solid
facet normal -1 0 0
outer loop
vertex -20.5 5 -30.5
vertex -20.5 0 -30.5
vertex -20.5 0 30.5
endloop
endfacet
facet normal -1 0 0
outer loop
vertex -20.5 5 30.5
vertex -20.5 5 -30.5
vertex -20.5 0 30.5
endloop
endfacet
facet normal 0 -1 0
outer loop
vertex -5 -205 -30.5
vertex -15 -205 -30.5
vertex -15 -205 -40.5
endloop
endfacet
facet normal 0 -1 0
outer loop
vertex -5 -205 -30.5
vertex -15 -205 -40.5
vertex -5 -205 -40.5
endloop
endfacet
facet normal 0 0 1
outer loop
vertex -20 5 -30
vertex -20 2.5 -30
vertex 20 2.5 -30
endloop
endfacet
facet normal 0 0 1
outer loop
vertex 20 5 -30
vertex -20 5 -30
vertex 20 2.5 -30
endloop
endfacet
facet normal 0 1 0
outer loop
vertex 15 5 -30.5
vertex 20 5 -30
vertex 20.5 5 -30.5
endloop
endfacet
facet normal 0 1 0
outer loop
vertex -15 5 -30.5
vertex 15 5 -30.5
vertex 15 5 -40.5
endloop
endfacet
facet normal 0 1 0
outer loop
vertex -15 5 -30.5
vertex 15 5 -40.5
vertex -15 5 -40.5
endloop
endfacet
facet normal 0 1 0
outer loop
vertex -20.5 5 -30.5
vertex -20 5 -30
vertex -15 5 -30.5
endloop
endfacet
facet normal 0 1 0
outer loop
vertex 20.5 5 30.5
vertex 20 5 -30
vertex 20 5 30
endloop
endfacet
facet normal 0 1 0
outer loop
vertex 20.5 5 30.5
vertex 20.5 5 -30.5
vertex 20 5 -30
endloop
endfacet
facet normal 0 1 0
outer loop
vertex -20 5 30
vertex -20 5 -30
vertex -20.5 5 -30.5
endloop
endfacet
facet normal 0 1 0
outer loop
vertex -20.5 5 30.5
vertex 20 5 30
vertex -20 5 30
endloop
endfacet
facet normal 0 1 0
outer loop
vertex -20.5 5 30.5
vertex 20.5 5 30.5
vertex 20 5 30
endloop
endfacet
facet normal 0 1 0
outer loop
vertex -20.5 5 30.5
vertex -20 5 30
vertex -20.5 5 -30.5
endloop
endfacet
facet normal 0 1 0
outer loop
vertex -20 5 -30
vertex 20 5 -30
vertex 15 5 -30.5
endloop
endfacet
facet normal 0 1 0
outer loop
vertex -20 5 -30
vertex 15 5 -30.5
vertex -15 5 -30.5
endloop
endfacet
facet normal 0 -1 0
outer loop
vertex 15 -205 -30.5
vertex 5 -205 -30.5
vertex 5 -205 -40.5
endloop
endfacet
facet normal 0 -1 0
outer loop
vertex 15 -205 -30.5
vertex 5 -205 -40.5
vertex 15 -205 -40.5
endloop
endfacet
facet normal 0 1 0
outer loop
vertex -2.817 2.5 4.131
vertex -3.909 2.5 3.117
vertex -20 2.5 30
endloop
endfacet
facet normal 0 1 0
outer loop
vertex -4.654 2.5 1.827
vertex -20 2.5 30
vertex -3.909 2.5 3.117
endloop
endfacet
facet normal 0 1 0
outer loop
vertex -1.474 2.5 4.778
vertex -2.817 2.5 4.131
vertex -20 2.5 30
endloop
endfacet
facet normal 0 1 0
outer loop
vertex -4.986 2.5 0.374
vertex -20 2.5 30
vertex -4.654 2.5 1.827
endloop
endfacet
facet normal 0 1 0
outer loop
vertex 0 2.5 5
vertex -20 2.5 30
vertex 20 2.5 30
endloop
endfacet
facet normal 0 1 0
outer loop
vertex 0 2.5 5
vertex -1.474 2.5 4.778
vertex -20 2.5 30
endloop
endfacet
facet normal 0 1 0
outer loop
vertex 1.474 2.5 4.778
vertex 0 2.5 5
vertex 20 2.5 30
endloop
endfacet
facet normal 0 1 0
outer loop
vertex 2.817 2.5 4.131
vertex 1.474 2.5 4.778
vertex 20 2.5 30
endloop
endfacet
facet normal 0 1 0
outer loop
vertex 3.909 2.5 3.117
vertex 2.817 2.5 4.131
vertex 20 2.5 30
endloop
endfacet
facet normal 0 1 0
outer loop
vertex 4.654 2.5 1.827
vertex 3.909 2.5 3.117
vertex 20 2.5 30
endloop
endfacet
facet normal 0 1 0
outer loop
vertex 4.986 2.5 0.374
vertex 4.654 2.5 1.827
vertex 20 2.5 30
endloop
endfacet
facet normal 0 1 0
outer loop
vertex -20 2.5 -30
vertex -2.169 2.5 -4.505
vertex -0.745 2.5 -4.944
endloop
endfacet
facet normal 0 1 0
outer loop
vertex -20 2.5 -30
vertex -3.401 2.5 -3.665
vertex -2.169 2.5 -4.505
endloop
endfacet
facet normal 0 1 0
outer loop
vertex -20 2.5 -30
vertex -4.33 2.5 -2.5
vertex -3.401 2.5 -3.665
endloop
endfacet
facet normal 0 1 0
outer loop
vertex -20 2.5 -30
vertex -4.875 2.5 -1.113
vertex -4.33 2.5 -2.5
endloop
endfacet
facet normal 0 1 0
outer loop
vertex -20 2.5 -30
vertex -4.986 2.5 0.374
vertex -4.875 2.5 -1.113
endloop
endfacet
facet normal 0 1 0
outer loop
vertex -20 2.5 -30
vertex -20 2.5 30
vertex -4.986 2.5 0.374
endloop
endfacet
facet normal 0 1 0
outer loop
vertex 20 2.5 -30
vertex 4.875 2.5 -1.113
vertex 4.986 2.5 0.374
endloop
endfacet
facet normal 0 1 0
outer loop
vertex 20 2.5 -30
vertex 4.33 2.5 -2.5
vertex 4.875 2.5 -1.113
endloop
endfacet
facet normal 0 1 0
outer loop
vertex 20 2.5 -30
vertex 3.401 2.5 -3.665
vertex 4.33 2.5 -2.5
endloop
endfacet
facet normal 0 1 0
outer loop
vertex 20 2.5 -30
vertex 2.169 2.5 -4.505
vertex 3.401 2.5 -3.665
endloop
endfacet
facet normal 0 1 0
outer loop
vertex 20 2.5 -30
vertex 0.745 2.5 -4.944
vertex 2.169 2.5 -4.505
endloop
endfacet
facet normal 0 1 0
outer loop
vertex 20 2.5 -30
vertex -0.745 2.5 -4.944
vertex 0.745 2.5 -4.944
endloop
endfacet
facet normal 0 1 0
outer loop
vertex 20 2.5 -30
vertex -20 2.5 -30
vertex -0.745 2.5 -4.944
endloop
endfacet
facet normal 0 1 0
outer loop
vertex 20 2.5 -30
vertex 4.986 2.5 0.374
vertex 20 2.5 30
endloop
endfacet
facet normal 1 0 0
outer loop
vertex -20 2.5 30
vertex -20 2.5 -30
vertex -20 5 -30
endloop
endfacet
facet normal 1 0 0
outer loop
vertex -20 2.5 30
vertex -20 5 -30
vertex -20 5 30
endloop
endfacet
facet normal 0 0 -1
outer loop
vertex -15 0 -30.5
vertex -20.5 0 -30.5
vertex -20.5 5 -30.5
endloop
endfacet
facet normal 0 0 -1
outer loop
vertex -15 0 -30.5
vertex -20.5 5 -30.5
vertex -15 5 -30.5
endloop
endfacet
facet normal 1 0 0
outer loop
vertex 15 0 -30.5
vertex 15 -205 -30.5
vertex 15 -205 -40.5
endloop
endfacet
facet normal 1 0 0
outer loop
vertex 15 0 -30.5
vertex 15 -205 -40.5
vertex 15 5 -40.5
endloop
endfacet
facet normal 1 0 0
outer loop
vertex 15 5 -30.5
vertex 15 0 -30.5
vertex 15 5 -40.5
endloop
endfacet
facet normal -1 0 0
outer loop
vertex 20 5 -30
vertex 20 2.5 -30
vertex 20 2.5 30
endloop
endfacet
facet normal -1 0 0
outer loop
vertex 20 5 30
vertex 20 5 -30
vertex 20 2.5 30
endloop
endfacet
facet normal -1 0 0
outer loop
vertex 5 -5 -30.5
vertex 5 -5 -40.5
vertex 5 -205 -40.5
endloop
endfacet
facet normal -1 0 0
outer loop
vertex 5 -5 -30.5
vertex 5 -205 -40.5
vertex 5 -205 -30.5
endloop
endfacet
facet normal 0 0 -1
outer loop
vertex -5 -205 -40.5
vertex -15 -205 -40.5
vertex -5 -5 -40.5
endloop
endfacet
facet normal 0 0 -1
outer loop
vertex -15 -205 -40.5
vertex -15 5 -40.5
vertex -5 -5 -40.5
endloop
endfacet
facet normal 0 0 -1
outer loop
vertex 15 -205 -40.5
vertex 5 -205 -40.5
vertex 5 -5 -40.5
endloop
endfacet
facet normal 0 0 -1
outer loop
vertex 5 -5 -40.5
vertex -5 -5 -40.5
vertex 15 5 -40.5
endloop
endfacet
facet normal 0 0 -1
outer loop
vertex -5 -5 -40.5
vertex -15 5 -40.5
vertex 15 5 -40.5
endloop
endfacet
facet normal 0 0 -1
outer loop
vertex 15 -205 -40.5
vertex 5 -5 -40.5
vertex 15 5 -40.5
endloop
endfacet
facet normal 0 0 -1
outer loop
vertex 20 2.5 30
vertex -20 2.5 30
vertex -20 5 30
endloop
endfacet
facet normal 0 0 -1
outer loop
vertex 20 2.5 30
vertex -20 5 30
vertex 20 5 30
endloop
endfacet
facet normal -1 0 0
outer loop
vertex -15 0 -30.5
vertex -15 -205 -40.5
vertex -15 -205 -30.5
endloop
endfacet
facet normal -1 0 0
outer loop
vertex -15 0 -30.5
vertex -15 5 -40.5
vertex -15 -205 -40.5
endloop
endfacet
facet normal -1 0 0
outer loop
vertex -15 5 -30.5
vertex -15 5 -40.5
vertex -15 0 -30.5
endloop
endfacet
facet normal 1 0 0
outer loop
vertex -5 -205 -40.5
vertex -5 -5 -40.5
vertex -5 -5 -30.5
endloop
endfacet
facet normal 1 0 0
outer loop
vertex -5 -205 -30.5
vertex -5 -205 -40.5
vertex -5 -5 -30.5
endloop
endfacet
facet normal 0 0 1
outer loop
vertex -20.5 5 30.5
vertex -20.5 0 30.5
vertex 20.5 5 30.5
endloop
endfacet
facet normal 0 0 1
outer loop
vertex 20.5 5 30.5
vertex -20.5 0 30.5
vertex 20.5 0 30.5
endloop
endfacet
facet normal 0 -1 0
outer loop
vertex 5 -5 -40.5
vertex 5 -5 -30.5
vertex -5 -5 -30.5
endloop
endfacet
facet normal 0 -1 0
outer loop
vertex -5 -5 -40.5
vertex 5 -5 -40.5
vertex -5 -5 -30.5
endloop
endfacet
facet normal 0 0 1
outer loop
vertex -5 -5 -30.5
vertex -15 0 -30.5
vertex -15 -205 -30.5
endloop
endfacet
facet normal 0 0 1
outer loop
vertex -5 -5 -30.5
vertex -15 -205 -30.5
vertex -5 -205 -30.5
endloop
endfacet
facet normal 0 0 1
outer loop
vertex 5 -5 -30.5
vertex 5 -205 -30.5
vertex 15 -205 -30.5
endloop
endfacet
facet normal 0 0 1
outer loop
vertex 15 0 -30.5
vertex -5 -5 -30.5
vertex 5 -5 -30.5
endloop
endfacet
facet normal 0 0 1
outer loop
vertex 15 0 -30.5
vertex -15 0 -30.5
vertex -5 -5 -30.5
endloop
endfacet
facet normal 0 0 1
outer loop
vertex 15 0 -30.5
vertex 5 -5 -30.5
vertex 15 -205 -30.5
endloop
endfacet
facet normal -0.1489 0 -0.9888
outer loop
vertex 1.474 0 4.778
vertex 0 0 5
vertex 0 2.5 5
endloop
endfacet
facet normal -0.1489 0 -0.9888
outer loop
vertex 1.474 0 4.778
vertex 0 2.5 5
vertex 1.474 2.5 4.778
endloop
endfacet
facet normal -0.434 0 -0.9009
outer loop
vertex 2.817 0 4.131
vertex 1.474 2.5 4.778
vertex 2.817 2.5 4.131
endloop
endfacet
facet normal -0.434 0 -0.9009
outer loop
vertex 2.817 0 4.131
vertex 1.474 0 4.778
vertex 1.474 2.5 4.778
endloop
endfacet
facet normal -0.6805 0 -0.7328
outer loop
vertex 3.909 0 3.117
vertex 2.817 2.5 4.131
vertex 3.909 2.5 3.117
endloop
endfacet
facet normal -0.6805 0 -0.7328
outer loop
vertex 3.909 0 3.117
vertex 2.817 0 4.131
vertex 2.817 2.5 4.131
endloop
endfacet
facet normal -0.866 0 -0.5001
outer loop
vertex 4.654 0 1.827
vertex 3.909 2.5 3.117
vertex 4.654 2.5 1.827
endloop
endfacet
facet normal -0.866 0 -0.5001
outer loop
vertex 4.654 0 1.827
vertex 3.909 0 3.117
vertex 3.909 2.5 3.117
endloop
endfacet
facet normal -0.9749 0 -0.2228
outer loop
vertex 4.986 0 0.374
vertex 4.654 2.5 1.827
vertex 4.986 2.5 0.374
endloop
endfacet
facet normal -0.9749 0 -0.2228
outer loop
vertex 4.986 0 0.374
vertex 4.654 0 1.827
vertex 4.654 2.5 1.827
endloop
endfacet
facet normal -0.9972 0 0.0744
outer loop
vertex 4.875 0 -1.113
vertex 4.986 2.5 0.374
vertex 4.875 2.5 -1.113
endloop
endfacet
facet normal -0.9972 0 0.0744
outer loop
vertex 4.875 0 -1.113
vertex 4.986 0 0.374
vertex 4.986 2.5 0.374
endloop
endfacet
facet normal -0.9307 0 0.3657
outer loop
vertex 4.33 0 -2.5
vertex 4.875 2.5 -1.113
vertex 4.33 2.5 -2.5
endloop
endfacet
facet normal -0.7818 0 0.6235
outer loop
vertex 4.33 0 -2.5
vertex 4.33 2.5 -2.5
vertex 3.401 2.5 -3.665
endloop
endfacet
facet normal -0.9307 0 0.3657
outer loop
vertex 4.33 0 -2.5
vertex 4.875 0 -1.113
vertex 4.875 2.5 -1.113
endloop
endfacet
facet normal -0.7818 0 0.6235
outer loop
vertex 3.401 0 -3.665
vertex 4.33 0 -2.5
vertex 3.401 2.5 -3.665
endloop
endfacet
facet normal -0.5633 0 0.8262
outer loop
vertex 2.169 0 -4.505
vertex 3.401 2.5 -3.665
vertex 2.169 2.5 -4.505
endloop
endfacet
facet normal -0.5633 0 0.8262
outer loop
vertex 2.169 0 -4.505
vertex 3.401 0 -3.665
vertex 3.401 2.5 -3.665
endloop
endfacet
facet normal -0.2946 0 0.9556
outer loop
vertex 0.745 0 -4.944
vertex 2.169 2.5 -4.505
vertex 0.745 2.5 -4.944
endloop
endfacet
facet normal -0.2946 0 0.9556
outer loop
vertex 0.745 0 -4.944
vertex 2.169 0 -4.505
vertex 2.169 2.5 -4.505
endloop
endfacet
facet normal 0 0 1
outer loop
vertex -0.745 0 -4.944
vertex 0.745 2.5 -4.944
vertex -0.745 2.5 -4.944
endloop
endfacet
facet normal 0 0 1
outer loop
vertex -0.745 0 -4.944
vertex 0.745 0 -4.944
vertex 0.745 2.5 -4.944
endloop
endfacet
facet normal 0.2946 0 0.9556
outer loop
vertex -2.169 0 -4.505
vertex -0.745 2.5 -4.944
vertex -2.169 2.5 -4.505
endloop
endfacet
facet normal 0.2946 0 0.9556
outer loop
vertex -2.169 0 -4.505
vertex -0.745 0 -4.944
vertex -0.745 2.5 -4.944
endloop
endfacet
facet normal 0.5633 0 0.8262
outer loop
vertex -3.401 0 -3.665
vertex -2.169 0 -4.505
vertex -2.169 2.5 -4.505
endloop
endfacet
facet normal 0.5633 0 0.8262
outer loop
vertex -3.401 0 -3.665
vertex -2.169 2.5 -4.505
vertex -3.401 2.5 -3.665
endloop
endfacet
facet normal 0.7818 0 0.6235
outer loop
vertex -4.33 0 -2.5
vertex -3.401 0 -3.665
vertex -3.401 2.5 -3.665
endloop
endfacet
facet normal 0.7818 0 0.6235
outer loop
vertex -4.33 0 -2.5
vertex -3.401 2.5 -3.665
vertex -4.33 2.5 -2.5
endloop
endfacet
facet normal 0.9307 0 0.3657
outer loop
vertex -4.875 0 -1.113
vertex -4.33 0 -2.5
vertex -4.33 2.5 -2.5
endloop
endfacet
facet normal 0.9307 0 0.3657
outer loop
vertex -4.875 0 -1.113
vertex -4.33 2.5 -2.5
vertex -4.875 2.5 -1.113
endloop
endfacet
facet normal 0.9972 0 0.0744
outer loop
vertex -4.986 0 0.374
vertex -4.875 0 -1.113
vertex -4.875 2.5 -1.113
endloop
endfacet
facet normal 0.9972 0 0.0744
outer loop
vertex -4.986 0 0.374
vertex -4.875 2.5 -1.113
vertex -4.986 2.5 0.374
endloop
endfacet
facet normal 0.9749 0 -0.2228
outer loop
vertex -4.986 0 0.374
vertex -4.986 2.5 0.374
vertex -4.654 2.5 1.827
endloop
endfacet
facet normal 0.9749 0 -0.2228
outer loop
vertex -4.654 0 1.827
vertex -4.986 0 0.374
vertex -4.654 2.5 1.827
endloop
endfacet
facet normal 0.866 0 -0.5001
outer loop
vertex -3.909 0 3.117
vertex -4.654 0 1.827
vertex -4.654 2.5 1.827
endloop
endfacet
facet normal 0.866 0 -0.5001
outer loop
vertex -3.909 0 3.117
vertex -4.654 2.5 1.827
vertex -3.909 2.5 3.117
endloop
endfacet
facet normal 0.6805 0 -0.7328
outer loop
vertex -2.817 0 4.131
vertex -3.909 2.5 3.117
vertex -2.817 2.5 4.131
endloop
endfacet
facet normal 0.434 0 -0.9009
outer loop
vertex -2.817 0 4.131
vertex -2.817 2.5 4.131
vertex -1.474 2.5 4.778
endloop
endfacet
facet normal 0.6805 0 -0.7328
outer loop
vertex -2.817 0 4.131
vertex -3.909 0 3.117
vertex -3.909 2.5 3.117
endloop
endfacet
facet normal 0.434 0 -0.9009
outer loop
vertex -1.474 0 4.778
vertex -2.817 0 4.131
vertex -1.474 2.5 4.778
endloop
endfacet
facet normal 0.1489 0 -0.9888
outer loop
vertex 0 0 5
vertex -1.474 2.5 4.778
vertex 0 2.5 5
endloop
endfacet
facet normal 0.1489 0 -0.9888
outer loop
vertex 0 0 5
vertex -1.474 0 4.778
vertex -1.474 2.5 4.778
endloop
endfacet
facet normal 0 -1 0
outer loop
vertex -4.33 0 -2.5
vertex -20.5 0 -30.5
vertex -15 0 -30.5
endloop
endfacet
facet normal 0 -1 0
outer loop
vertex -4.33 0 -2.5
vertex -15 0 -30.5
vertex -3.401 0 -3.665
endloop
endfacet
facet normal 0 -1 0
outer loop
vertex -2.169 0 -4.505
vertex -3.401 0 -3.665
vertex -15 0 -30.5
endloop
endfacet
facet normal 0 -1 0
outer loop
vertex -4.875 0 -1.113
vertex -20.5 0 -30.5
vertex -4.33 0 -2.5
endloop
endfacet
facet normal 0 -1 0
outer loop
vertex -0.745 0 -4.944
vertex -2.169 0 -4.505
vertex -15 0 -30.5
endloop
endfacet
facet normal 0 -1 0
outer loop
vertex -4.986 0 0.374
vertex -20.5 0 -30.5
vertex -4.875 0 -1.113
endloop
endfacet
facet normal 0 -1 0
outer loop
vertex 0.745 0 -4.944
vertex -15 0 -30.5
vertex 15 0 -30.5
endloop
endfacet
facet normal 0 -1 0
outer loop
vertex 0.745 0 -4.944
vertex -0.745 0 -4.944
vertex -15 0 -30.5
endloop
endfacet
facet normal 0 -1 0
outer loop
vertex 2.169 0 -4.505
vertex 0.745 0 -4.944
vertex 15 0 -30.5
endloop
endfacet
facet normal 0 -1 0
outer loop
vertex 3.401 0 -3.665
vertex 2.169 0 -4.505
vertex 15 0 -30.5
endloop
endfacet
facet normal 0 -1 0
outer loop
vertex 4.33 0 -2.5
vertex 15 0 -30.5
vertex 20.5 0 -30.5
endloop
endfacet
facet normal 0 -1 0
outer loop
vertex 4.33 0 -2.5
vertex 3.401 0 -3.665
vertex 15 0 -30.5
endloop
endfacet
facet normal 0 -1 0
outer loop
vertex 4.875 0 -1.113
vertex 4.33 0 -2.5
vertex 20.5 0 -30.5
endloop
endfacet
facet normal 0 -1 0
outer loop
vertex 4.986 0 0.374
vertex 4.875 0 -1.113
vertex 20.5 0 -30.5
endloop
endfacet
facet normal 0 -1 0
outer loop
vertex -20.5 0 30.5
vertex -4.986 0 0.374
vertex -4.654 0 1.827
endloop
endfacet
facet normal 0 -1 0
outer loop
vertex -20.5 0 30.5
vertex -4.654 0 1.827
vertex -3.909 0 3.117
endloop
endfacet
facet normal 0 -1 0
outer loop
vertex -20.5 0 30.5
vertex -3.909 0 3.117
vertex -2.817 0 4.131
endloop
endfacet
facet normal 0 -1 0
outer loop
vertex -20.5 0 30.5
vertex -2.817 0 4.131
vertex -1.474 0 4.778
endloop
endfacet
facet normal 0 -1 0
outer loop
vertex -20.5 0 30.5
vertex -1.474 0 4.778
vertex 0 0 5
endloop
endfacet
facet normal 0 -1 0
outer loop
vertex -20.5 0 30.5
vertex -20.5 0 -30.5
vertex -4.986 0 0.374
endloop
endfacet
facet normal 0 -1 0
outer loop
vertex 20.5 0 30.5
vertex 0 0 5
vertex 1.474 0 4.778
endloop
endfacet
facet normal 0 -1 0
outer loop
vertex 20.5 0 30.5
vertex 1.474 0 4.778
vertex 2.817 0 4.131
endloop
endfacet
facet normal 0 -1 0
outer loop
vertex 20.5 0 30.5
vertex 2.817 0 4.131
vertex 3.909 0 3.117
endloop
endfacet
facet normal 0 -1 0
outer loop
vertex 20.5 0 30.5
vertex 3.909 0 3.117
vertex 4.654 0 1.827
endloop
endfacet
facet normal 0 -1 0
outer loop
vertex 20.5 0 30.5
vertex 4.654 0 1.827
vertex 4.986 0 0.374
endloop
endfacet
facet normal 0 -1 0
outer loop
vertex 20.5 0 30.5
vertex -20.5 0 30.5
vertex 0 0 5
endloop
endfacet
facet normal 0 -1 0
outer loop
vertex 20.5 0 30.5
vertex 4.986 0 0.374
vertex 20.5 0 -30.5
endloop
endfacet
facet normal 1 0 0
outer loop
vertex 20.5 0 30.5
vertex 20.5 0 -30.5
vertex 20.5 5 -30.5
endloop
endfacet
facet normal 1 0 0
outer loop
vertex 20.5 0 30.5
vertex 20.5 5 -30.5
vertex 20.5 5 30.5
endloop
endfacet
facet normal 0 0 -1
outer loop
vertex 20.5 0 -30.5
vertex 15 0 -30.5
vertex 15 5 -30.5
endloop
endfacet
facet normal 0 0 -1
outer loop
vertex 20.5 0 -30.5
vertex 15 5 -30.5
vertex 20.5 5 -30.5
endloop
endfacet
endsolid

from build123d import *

# Parameters (mm, degrees)
SKETCH1_W           = 40
SKETCH1_H           = 60
SKETCH1_R           = 5
BOSS_EXTRUDE1_DEPTH = 2.5
SKETCH2_W           = 41
SKETCH2_H           = 61
SKETCH2_W_2         = 40
SKETCH2_H_2         = 60
BOSS_EXTRUDE2_DEPTH = 5
SKETCH3_W           = 30
SKETCH3_H           = 10
BOSS_EXTRUDE3_DEPTH = 10
SKETCH4_W           = 10
SKETCH4_H           = 10
BOSS_EXTRUDE4_DEPTH = 200


with BuildPart() as part:
    # Sketch1 → Boss-Extrude1 (new body)
    with BuildSketch(Plane(origin=(0, 0, 0), x_dir=(1, 0, 0), z_dir=(0, 1, 0))):
        Rectangle(SKETCH1_W, SKETCH1_H)
        with Locations(Location((0, 0, 0), (0, 0, 270))):
            Circle(SKETCH1_R, mode=Mode.SUBTRACT)
    extrude(amount=BOSS_EXTRUDE1_DEPTH)

    # Sketch2 → Boss-Extrude2 (add)
    with BuildSketch(Plane.XZ):
        Rectangle(SKETCH2_W, SKETCH2_H)
        Rectangle(SKETCH2_W_2, SKETCH2_H_2, mode=Mode.SUBTRACT)
    extrude(amount=-BOSS_EXTRUDE2_DEPTH)

    # Sketch3 → Boss-Extrude3 (add)
    with BuildSketch(Plane(origin=(0, 0, -30.5), x_dir=(-1, 0, 0), z_dir=(0, 0, -1))):
        Rectangle(SKETCH3_W, SKETCH3_H)
    extrude(amount=BOSS_EXTRUDE3_DEPTH)

    # Sketch4 → Boss-Extrude4 (add)
    with BuildSketch(Plane.XZ.offset(5)):
        with Locations((-10, -35.5)):
            Rectangle(SKETCH4_W, SKETCH4_H)
        with Locations((10, -35.5)):
            Rectangle(SKETCH4_W, SKETCH4_H)
    extrude(amount=BOSS_EXTRUDE4_DEPTH)


solid = part.part
